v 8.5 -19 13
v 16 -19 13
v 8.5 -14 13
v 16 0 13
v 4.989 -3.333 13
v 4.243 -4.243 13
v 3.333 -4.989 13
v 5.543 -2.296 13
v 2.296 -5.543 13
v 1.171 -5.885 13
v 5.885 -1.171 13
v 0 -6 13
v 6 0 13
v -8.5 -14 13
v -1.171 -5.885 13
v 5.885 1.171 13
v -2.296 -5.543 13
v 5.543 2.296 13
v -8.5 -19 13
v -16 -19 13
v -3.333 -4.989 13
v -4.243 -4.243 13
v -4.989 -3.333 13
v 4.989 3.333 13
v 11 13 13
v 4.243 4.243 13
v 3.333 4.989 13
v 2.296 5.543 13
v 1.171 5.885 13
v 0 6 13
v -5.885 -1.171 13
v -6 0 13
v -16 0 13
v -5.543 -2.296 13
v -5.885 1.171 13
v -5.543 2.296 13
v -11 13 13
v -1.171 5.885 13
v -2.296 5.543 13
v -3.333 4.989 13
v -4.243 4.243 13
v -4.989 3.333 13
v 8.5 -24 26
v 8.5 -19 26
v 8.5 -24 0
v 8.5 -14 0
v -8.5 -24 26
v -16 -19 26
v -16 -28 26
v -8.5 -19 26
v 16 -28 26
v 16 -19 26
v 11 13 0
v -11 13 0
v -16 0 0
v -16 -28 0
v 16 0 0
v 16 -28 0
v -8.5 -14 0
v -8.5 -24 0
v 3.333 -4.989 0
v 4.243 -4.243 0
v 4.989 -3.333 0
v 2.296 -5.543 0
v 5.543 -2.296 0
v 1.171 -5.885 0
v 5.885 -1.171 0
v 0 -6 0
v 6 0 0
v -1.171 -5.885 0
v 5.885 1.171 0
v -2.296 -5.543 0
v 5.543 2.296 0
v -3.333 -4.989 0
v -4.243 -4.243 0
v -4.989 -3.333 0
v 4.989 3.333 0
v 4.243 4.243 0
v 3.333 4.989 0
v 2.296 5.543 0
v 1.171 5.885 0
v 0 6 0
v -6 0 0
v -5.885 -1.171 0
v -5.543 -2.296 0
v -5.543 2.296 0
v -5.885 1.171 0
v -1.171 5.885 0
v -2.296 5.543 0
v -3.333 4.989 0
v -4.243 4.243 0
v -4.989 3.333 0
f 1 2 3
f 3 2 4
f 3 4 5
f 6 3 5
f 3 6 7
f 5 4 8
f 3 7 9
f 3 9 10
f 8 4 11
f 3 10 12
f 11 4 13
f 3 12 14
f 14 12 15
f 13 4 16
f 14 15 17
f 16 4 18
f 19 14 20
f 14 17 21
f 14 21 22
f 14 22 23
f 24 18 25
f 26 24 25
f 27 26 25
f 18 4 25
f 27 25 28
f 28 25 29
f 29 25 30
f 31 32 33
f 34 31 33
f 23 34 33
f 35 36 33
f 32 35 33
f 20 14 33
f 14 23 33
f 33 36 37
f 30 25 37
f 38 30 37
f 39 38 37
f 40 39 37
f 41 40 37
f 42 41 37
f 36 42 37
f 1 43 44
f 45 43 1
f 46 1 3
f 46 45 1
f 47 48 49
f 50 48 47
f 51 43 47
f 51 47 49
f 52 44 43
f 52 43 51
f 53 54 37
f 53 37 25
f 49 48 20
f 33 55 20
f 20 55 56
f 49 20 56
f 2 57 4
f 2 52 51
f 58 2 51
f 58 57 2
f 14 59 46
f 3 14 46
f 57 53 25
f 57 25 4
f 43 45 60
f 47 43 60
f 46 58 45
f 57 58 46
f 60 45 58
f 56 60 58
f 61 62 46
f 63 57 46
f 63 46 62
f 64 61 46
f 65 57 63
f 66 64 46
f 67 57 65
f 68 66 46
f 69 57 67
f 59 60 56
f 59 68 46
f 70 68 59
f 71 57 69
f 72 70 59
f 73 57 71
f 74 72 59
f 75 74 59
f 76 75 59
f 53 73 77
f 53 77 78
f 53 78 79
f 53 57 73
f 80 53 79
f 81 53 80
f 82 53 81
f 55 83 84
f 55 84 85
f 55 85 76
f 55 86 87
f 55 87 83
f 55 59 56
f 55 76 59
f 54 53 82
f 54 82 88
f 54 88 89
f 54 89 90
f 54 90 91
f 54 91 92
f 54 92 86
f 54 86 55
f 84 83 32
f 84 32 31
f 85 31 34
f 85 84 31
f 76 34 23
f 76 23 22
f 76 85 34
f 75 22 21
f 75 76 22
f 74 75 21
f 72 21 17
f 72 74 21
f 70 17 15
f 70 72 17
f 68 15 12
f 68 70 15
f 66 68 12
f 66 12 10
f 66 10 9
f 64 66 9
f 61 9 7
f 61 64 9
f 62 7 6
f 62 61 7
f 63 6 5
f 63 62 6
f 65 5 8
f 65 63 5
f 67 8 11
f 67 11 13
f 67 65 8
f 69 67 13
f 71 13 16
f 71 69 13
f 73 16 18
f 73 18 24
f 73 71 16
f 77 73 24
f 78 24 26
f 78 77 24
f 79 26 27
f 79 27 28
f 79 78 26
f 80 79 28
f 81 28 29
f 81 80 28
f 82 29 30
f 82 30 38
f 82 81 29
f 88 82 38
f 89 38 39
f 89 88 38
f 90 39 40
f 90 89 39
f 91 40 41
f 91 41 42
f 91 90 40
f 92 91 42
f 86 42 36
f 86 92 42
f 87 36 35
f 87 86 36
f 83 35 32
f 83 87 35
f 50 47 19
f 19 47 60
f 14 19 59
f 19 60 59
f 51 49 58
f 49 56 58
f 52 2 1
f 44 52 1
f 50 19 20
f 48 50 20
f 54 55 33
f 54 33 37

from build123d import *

# Parameters (mm, degrees)
SKETCH_1_R      = 6
SKETCH_1_W      = 17
SKETCH_1_H      = 10
EXTRUDE_1_DEPTH = 13
EXTRUDE_2_DEPTH = 13


with BuildPart() as part:
    # 草图1 → 凸台-拉伸1 (new body)
    with BuildSketch(Plane.XY):
        Polygon((-11, 13), (11, 13), (16, 0), (16, -28), (-16, -28), (-16, 0), align=None)
        with Locations(Location((0, 0, 0), (0, 0, 180))):
            Circle(SKETCH_1_R, mode=Mode.SUBTRACT)
        with Locations((0, -19)):
            Rectangle(SKETCH_1_W, SKETCH_1_H, mode=Mode.SUBTRACT)
    extrude(amount=EXTRUDE_1_DEPTH)

    # 草图2 → 凸台-拉伸2 (add)
    with BuildSketch(Plane.XY.offset(13)):
        Polygon((-8.5, -19), (-16, -19), (-16, -28), (16, -28), (16, -19), (8.5, -19), (8.5, -24), (-8.5, -24), align=None)
    extrude(amount=EXTRUDE_2_DEPTH)


solid = part.part
